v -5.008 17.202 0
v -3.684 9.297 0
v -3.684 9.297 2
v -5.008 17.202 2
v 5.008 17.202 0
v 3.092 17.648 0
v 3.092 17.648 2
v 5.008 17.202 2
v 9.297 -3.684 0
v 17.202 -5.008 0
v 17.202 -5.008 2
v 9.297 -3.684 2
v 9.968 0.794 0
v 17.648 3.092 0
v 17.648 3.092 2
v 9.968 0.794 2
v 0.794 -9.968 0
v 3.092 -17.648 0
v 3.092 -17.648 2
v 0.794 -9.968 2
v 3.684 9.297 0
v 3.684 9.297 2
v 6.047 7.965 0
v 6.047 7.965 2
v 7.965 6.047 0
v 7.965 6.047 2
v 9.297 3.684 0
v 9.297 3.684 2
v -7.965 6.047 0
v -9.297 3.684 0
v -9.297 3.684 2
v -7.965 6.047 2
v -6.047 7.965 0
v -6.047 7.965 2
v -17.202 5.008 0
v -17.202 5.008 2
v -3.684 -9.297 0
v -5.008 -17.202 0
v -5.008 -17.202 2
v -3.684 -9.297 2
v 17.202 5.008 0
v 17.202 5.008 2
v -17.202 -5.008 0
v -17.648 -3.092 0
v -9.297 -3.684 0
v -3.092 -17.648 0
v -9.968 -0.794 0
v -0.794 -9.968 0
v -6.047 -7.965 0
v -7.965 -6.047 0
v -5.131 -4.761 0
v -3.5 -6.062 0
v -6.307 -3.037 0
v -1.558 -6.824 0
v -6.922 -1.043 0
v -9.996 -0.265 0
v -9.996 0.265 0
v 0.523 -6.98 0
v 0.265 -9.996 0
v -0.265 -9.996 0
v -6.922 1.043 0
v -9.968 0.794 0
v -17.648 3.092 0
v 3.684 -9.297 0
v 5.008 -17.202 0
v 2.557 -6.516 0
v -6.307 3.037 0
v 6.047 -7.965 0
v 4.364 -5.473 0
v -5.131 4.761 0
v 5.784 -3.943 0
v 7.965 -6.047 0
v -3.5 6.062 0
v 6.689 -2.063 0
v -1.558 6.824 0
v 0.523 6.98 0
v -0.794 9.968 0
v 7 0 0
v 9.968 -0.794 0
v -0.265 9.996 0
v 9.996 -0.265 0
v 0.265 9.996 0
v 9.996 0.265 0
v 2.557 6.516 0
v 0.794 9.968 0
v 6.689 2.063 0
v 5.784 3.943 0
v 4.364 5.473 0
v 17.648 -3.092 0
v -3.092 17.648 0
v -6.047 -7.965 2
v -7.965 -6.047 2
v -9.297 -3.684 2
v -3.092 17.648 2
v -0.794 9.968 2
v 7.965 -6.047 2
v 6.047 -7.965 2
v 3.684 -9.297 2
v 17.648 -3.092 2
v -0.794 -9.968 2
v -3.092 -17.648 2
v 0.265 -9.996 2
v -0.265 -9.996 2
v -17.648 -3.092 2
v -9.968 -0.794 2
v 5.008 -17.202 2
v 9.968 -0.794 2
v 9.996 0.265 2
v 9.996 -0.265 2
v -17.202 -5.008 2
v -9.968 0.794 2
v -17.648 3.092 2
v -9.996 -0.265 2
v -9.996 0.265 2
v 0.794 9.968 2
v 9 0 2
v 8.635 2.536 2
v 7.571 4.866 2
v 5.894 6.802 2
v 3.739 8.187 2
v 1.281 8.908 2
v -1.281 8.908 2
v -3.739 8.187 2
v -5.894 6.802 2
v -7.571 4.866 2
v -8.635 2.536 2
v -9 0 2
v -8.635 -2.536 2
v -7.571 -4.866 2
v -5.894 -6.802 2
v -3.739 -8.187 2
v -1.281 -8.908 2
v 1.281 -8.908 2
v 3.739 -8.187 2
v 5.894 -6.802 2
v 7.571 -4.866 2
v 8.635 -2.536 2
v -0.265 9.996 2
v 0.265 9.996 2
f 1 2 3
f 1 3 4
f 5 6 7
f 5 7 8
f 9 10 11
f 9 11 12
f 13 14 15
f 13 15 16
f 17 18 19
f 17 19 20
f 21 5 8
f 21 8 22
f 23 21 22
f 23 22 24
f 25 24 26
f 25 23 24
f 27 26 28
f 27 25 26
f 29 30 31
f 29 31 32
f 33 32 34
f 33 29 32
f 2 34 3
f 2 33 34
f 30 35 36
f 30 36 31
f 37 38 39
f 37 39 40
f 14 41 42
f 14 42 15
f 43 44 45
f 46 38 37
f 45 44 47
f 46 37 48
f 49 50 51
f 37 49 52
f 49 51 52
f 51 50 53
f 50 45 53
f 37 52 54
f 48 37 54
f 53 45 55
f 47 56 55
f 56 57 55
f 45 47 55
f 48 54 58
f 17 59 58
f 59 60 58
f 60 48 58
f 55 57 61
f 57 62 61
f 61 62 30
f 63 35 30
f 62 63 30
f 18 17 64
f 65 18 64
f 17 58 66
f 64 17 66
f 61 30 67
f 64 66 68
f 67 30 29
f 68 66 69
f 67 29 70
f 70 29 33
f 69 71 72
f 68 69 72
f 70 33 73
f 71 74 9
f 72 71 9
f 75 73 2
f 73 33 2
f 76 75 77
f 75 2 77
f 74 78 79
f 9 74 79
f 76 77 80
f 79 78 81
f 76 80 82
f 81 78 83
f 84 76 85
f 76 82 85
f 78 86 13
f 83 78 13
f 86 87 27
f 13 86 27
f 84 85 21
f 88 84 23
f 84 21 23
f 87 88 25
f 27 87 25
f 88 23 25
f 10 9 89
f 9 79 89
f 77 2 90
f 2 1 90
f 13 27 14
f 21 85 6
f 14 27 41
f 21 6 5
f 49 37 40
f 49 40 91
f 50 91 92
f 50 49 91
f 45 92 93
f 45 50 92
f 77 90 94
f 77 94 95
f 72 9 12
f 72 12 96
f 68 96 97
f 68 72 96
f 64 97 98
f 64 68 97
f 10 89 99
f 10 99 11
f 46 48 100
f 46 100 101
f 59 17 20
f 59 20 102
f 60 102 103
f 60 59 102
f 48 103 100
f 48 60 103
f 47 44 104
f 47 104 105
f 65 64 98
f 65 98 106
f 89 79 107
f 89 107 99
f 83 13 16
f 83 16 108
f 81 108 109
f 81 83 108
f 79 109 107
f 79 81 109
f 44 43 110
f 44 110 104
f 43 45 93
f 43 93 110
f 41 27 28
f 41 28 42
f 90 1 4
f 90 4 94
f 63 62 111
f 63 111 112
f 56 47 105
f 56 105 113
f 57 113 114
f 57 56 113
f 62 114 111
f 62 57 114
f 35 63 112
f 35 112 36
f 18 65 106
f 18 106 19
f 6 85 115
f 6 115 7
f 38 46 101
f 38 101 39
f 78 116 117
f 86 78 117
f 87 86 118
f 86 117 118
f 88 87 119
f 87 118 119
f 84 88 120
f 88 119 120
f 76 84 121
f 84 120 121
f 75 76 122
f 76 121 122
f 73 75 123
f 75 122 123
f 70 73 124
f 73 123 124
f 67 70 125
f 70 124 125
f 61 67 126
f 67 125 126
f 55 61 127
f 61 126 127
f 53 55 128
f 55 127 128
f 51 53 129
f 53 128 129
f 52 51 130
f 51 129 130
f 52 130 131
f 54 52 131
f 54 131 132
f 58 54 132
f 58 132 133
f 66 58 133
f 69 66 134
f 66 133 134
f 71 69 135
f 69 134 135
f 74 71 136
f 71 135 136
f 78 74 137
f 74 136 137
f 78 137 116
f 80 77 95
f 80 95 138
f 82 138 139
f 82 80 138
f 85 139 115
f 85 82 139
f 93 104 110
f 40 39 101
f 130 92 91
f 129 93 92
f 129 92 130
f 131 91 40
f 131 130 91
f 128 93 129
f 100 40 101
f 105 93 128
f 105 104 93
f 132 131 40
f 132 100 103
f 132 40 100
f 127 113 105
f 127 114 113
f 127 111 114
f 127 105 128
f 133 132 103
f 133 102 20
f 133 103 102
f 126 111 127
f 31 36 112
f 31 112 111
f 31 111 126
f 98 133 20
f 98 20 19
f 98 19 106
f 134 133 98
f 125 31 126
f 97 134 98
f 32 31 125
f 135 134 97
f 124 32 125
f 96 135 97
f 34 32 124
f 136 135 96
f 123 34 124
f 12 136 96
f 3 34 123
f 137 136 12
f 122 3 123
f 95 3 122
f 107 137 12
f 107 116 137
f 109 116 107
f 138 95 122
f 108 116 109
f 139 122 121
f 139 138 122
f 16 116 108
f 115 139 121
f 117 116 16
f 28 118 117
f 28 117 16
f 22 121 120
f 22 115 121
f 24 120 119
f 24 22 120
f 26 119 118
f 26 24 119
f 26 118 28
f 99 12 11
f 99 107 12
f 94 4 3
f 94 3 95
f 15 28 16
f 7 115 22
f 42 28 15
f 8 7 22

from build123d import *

# Parameters (mm, degrees)
SKETCH_1_R              = 20
EXTRUDE_1_DEPTH         = 2
SKETCH_2_R              = 7
CUT_EXTRUDE_1_DEPTH     = 2
CUT_EXTRUDE_START       = -2
CUT_EXTRUDE_2_OUTLINE_R = 20
CUT_EXTRUDE_2_DEPTH     = 2
CHAMFER_4_SIZE          = 2


# Read off the part's stored shape, not the designer's step: 切除-拉伸2
with BuildPart() as part:
    # 草图1 → 凸台-拉伸1 (new body)
    with BuildSketch(Plane.XY):
        Circle(SKETCH_1_R)
    extrude(amount=EXTRUDE_1_DEPTH)

    # 草图2 → 切除-拉伸1 (cut)
    with BuildSketch(Plane.XY.offset(2)):
        Circle(SKETCH_2_R)
    extrude(amount=-CUT_EXTRUDE_1_DEPTH, mode=Mode.SUBTRACT)

    # 切除-拉伸2 outline → 切除-拉伸2 (cut)
    with BuildSketch(Plane.XY.offset(2).offset(CUT_EXTRUDE_START)):
        Circle(CUT_EXTRUDE_2_OUTLINE_R)
        with BuildLine():
            Line((-3.683674436, 9.296802819), (-5.007717322, 17.202301566))
            Line((-5.007717322, 17.202301566), (-3.091969732, 17.647553233))
            Line((-3.091969732, 17.647553233), (-0.793888425, 9.968437248))
            ThreePointArc((-0.793888425, 9.968437248), (0, 10), (0.793888425, 9.968437248))
            Line((0.793888425, 9.968437248), (3.091969732, 17.647553233))
            Line((3.091969732, 17.647553233), (5.007717322, 17.202301566))
            Line((5.007717322, 17.202301566), (3.683674436, 9.296802819))
            ThreePointArc((3.683674436, 9.296802819), (7.071067812, 7.071067812), (9.296802819, 3.683674436))
            Line((9.296802819, 3.683674436), (17.202301566, 5.007717322))
            Line((17.202301566, 5.007717322), (17.647553233, 3.091969732))
            Line((17.647553233, 3.091969732), (9.968437248, 0.793888425))
            ThreePointArc((9.968437248, 0.793888425), (10, 0), (9.968437248, -0.793888425))
            Line((9.968437248, -0.793888425), (17.647553233, -3.091969732))
            Line((17.647553233, -3.091969732), (17.202301566, -5.007717322))
            Line((17.202301566, -5.007717322), (9.296802819, -3.683674436))
            ThreePointArc((9.296802819, -3.683674436), (7.071067812, -7.071067812), (3.683674436, -9.296802819))
            Line((3.683674436, -9.296802819), (5.007717322, -17.202301566))
            Line((5.007717322, -17.202301566), (3.091969732, -17.647553233))
            Line((3.091969732, -17.647553233), (0.793888425, -9.968437248))
            ThreePointArc((0.793888425, -9.968437248), (0, -10), (-0.793888425, -9.968437248))
            Line((-0.793888425, -9.968437248), (-3.091969732, -17.647553233))
            Line((-3.091969732, -17.647553233), (-5.007717322, -17.202301566))
            Line((-5.007717322, -17.202301566), (-3.683674436, -9.296802819))
            ThreePointArc((-3.683674436, -9.296802819), (-7.071067812, -7.071067812), (-9.296802819, -3.683674436))
            Line((-9.296802819, -3.683674436), (-17.202301566, -5.007717322))
            Line((-17.202301566, -5.007717322), (-17.647553233, -3.091969732))
            Line((-17.647553233, -3.091969732), (-9.968437248, -0.793888425))
            ThreePointArc((-9.968437248, -0.793888425), (-10, 0), (-9.968437248, 0.793888425))
            Line((-9.968437248, 0.793888425), (-17.647553233, 3.091969732))
            Line((-17.647553233, 3.091969732), (-17.202301566, 5.007717322))
            Line((-17.202301566, 5.007717322), (-9.296802819, 3.683674436))
            ThreePointArc((-9.296802819, 3.683674436), (-7.071067812, 7.071067812), (-3.683674436, 9.296802819))
        make_face(mode=Mode.SUBTRACT)
    extrude(amount=CUT_EXTRUDE_2_DEPTH, mode=Mode.SUBTRACT)

    # 倒角4
    chamfer_4_edges = [part.edges().sort_by_distance(p)[0] for p in [
        (-7, 0, 2),
    ]]
    chamfer(chamfer_4_edges, length=CHAMFER_4_SIZE - 0.0001)  # a hair under: the kernel refuses the full size


solid = part.part
